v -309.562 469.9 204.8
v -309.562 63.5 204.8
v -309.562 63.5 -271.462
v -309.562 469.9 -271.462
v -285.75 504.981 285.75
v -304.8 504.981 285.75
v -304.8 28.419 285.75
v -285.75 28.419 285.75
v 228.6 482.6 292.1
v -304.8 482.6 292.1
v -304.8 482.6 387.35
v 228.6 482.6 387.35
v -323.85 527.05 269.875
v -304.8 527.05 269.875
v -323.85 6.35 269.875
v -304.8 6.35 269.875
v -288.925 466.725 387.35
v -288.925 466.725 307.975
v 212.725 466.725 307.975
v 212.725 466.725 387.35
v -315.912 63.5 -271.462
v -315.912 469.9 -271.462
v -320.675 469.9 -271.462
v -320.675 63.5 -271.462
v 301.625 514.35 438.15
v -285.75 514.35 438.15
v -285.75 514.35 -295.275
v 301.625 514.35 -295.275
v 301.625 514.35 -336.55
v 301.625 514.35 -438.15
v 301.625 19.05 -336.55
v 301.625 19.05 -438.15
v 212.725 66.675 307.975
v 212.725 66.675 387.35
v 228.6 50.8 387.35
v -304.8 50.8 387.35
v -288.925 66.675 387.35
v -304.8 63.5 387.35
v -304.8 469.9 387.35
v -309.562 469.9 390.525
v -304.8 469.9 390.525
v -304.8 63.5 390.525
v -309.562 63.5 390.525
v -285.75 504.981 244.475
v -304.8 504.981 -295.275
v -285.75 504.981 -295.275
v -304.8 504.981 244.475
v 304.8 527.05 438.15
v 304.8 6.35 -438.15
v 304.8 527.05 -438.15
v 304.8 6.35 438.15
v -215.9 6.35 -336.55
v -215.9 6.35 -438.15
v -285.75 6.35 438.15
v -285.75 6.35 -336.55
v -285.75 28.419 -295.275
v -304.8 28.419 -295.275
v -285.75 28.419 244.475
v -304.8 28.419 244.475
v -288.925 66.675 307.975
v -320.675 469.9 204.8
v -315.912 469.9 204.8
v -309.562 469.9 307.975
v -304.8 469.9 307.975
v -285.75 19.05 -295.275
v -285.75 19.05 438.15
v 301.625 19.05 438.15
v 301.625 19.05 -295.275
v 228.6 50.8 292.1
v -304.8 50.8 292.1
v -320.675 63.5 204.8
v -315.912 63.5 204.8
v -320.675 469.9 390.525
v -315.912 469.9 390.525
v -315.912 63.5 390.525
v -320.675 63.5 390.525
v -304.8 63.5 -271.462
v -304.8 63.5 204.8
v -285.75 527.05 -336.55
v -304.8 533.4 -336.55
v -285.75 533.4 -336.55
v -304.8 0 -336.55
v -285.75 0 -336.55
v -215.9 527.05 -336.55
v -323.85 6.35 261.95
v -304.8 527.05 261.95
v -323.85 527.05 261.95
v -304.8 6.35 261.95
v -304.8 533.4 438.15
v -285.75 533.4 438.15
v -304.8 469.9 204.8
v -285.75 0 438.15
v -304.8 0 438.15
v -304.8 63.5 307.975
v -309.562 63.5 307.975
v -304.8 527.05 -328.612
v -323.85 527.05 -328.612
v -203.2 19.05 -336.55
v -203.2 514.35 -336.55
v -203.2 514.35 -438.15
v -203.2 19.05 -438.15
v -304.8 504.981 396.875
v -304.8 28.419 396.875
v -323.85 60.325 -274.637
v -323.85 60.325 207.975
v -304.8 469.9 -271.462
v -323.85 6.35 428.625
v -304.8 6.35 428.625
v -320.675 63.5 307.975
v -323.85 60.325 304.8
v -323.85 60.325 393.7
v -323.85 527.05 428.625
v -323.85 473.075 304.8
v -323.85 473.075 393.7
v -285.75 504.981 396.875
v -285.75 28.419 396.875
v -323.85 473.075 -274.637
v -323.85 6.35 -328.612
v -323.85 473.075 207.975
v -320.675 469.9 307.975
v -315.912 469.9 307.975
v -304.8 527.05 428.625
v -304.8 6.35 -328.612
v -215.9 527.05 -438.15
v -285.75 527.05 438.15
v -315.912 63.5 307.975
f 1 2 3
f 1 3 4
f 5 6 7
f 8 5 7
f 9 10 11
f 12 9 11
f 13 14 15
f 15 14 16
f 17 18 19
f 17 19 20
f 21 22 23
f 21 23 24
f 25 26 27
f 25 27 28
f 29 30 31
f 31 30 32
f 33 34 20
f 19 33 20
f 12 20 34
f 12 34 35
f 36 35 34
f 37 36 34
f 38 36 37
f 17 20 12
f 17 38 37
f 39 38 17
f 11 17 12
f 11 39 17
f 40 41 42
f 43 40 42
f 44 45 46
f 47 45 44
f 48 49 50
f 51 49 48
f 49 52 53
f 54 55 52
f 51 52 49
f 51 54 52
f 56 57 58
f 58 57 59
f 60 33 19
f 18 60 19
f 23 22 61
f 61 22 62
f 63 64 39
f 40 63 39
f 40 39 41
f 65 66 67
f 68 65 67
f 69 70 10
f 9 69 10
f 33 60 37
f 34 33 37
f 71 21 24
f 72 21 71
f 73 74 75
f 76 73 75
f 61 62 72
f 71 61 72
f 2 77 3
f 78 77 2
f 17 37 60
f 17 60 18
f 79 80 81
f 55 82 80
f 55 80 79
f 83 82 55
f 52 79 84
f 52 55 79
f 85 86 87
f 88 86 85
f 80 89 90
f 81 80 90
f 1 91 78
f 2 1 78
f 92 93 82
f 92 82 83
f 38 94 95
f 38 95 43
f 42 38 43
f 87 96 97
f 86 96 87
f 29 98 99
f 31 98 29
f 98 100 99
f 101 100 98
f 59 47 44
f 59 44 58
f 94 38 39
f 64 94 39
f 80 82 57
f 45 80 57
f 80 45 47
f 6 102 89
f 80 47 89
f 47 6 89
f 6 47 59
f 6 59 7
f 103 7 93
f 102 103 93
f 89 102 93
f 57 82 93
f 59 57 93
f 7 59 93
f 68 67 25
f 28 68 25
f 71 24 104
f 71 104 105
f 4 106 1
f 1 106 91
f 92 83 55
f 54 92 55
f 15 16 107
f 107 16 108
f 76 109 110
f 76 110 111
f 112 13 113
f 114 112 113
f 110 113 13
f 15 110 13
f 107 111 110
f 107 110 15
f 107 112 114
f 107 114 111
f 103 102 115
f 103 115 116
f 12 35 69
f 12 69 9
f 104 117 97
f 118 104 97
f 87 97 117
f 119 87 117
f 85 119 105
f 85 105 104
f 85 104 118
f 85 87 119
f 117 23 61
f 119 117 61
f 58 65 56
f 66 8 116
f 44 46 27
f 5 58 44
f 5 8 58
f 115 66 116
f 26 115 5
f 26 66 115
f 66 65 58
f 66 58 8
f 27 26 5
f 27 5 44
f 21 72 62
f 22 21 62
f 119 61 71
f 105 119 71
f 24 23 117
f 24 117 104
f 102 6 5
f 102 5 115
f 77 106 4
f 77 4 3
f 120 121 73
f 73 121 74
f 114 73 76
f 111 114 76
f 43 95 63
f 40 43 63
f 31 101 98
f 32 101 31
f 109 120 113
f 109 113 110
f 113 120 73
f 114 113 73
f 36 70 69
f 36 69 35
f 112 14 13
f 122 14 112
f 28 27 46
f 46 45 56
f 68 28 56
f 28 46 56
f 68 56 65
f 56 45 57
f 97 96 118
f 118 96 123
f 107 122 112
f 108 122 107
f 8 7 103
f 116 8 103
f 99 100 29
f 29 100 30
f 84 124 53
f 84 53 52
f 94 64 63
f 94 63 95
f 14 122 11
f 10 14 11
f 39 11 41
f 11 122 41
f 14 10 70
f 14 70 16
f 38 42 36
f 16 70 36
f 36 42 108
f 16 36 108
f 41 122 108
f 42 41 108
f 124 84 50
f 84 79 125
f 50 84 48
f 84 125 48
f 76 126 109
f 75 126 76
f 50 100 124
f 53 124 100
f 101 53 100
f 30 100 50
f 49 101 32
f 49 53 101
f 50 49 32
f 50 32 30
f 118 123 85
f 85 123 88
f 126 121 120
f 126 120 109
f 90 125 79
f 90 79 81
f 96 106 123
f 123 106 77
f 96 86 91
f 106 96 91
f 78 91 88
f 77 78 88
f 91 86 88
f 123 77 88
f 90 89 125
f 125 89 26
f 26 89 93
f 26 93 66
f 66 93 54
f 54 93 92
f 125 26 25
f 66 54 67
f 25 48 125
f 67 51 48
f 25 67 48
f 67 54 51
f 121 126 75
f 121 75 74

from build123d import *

# Parameters (mm, degrees)
F0_W          = 609.6
F0_H          = 876.3
F1_DEPTH      = 533.4
F2_W          = 88.9
F2_H          = 101.6
F3_DEPTH      = 533.401
F4_W          = 476.562295082
F4_H          = 692.15
F5_DEPTH      = 19.05
F6_W          = 590.55
F6_H          = 6.35
F7_DEPTH      = 876.301
F8_W          = 587.375
F8_H          = 495.3
F9_DEPTH      = 733.425
F10_W         = 476.562295082
F10_H         = 41.275
F11_DEPTH     = 19.05
F12_W         = 520.7
F12_H         = 590.5627
F12_W_2       = 406.4
F12_H_2       = 476.2627
F13_DEPTH     = 19.05
F14_W         = 6.35
F14_H         = 406.4
F15_DEPTH     = 476.2627
F16_SIZE      = 3.175
F17_W         = 520.7
F17_H         = 158.75
F17_W_2       = 406.4
F17_H_2       = 82.55
F18_DEPTH     = 19.05
F19_W         = 6.35
F19_H         = 406.4
F20_DEPTH     = 82.55
F21_SIZE      = 3.175
F22_W         = 504.825
F22_H         = 495.3
F23_DEPTH     = 101.6
F24_W         = 431.8
F24_H         = 95.25
F25_DEPTH     = 533.4
F26_T         = 15.875
F26_T3_DEPTH  = 37.249261314
F26_T5_DEPTH  = 37.249261314
F26_T7_DEPTH  = 37.249261314
F26_T9_DEPTH  = 37.249261314
F26_T11_DEPTH = 36.5125
F26_T13_DEPTH = 438.15
F26_T15_DEPTH = 114.3
F26_T17_DEPTH = 127
F26_T19_DEPTH = 463.55
F26_T21_DEPTH = 111.125
F26_T23_DEPTH = 36.5125


# Not quite as in the source:
# - a shell that OpenCascade refuses in one call is made with other operations: the cavity is built on its own and cut out


with BuildPart() as f1:
    # F0 (on Front) → F1 (new body)
    with BuildSketch(Plane.XZ):
        Rectangle(F0_W, F0_H)
    extrude(amount=-F1_DEPTH)

    # F2 (on face) → F3 (cut, through all)
    with BuildSketch(Plane.XZ):
        with Locations((-260.35, -387.35)):
            Rectangle(F2_W, F2_H)
    extrude(amount=-F3_DEPTH, mode=Mode.SUBTRACT)

    # F4 (on face) → F5 (cut)
    with BuildSketch(Plane(origin=(-304.8, 0, 0), x_dir=(0, -1, 0), z_dir=(-1, 0, 0))):
        with Locations((-266.7, 50.8)):
            Rectangle(F4_W, F4_H)
    extrude(amount=-F5_DEPTH, mode=Mode.SUBTRACT)

    # F6 (on face) → F7 (cut, through all)
    with BuildSketch(Plane.XY.offset(438.15)):
        with Locations((9.525, 530.225)):
            Rectangle(F6_W, F6_H)
        with Locations((9.525, 3.175)):
            Rectangle(F6_W, F6_H)
    extrude(amount=-F7_DEPTH, mode=Mode.SUBTRACT)

    # F8 (on face) → F9 (cut, through all)
    with BuildSketch(Plane.XY.offset(438.15)):
        with Locations((7.9375, 266.7)):
            Rectangle(F8_W, F8_H)
    extrude(amount=-F9_DEPTH, mode=Mode.SUBTRACT)

    # F10 (on face) → F11 (join, through all)
    with BuildSketch(Plane(origin=(-304.8, 0, 0), x_dir=(0, -1, 0), z_dir=(-1, 0, 0))):
        with Locations((-266.7, 265.1125)):
            Rectangle(F10_W, F10_H)
    extrude(amount=-F11_DEPTH)

    # F22 (on face) → F23 (cut)
    with BuildSketch(Plane(origin=(0, 0, -438.15), x_dir=(1, 0, 0), z_dir=(0, 0, -1))):
        with Locations((49.2125, -266.7)):
            Rectangle(F22_W, F22_H)
    extrude(amount=-F23_DEPTH, mode=Mode.SUBTRACT)


with BuildPart() as f13:
    # F12 (on face) → F13 (new body)
    with BuildSketch(Plane(origin=(-304.8, 0, 0), x_dir=(0, -1, 0), z_dir=(-1, 0, 0))):
        with Locations((-266.7, -33.33115)):
            Rectangle(F12_W, F12_H)
        with Locations((-266.7, -33.33115)):
            Rectangle(F12_W_2, F12_H_2, mode=Mode.SUBTRACT)
    extrude(amount=F13_DEPTH)

    # F14 (on face) → F15 (join, through all)
    with BuildSketch(Plane.XY.offset(-271.4625)):
        with Locations((-312.7375, 266.7)):
            Rectangle(F14_W, F14_H)
    extrude(amount=F15_DEPTH)

    # F16
    f16_edges = [f13.edges().sort_by_distance(p)[0] for p in [
        (-323.85, 469.9, -33.33115),
        (-323.85, 266.7, -271.4625),
        (-323.85, 63.5, -33.33115),
        (-323.85, 266.7, 204.8002),
    ]]
    chamfer(f16_edges, length=F16_SIZE)


with BuildPart() as f18:
    # F17 (on face) → F18 (new body)
    with BuildSketch(Plane(origin=(-304.8, 0, 0), x_dir=(0, -1, 0), z_dir=(-1, 0, 0))):
        with Locations((-266.7, 349.25)):
            Rectangle(F17_W, F17_H)
        with Locations((-266.7, 349.25)):
            Rectangle(F17_W_2, F17_H_2, mode=Mode.SUBTRACT)
    extrude(amount=F18_DEPTH)

    # F19 (on face) → F20 (join, through all)
    with BuildSketch(Plane.XY.offset(307.975)):
        with Locations((-312.7375, 266.7)):
            Rectangle(F19_W, F19_H)
    extrude(amount=F20_DEPTH)

    # F21
    f21_edges = [f18.edges().sort_by_distance(p)[0] for p in [
        (-323.85, 266.7, 307.975),
        (-323.85, 469.9, 349.25),
        (-323.85, 266.7, 390.525),
        (-323.85, 63.5, 349.25),
    ]]
    chamfer(f21_edges, length=F21_SIZE)

    # F24 (on face) → F25 (join)
    with BuildSketch(Plane.YZ.offset(-304.8)):
        with Locations((266.7, 339.725)):
            Rectangle(F24_W, F24_H)
    extrude(amount=F25_DEPTH)

    # F26: shell of thickness 15.875, made by hand


with BuildPart() as f26_core1:
    # F26_t2: copy of F18
    add(f18.part)

    # the walls: a layer under each face that stays
    f26_faces = [f26_core1.faces().sort_by_distance(p)[0] for p in [
        (-323.85, 440.2666666667, 296.3333333333),
        (-322.2625, 266.7, 306.3875),
        (-322.2625, 61.9125, 349.25),
        (-322.2625, 471.4875, 349.25),
        (-322.2625, 266.7, 392.1125),
        (-314.325, 266.7, 428.625),
        (-314.325, 527.05, 349.25),
        (-314.325, 266.7, 269.875),
        (-314.325, 6.35, 349.25),
        (-318.29375, 266.7, 307.975),
        (-318.29375, 63.5, 349.25),
        (-318.29375, 469.9, 349.25),
        (-318.29375, 266.7, 390.525),
        (-304.8, 440.2666666667, 402.1666666667),
        (-315.9125, 266.7, 349.25),
        (-38.1, 482.6, 339.725),
        (-38.1, 266.7, 292.1),
        (-38.1, 50.8, 339.725),
        (-307.18125, 63.5, 349.25),
        (-307.18125, 266.7, 390.525),
        (-307.18125, 469.9, 349.25),
        (-304.8, 266.7, 347.6625),
        (228.6, 266.7, 339.725),
        (-307.18125, 266.7, 307.975),
        (-309.5625, 266.7, 349.25),
    ]]
    thicken(f26_faces, amount=-F26_T, mode=Mode.SUBTRACT)

    # F26_s4 → F26_t3 (cut)
    with BuildSketch(Plane(origin=(4.5928978099, 4.5928978099, 4.5928978099), x_dir=(-0.7071067812, 0.7071067812, 0), z_dir=(0.5773502692, 0.5773502692, 0.5773502692))):
        Polygon((271.8908726623, 356.5892701441), (263.7152476623, 342.7036353262), (255.7777476623, 347.2863530879), (255.7777476623, 356.4517886113), align=None)
    extrude(amount=F26_T3_DEPTH, mode=Mode.SUBTRACT)

    # F26_s6 → F26_t5 (cut)
    with BuildSketch(Plane(origin=(-173.2071021901, 173.2071021901, -173.2071021901), x_dir=(0.7071067812, 0.7071067812, 0), z_dir=(0.5773502692, -0.5773502692, 0.5773502692))):
        Polygon((105.2798844226, 574.3489082775), (113.4555094226, 560.4632734596), (121.3930094226, 565.0459912213), (121.3930094226, 574.2114267447), align=None)
    extrude(amount=F26_T5_DEPTH, mode=Mode.SUBTRACT)

    # F26_s8 → F26_t7 (cut)
    with BuildSketch(Plane(origin=(-228.2404355234, -228.2404355234, 228.2404355234), x_dir=(-0.7071067812, 0.7071067812, 0), z_dir=(0.5773502692, 0.5773502692, -0.5773502692))):
        Polygon((271.8908726623, 213.7335916339), (255.7777476623, 213.8710731668), (255.7777476623, 223.0365086901), (263.7152476623, 227.6192264518), align=None)
    extrude(amount=F26_T7_DEPTH, mode=Mode.SUBTRACT)

    # F26_s10 → F26_t9 (cut)
    with BuildSketch(Plane(origin=(-406.0404355234, 406.0404355234, 406.0404355234), x_dir=(0.7071067812, 0.7071067812, 0), z_dir=(0.5773502692, -0.5773502692, -0.5773502692))):
        Polygon((105.2798844226, -4.0260464995), (121.3930094226, -3.8885649667), (121.3930094226, 5.2768705567), (113.4555094226, 9.8595883184), align=None)
    extrude(amount=F26_T9_DEPTH, mode=Mode.SUBTRACT)

    # F26_s12 → F26_t11 (cut)
    with BuildSketch(Plane.YZ.offset(-336.55)):
        Polygon((469.74125, 308.13375), (469.9, 292.1), (485.775, 292.1), (485.775, 307.975), align=None)
        Polygon((63.65875, 308.13375), (63.5, 292.1), (47.625, 292.1), (47.625, 307.975), align=None)
        Polygon((63.65875, 390.36625), (47.625, 390.525), (47.625, 406.4), (63.5, 406.4), align=None)
        Polygon((469.74125, 390.36625), (485.775, 390.525), (485.775, 406.4), (469.9, 406.4), align=None)
    extrude(amount=F26_T11_DEPTH, mode=Mode.SUBTRACT)

    # F26_s14 → F26_t13 (cut)
    with BuildSketch(Plane.XZ.offset(-485.775)):
        Polygon((-316.07125, 308.13375), (-315.9125, 292.1), (-300.0375, 292.1), (-300.0375, 307.975), align=None)
        Polygon((-316.07125, 390.36625), (-315.9125, 406.4), (-300.0375, 406.4), (-300.0375, 390.525), align=None)
        Polygon((-309.40375, 390.36625), (-309.5625, 406.4), (-325.4375, 406.4), (-325.4375, 390.525), align=None)
        Polygon((-304.95875, 308.13375), (-288.925, 307.975), (-288.925, 292.1), (-304.8, 292.1), align=None)
        Polygon((-309.40375, 308.13375), (-309.5625, 292.1), (-325.4375, 292.1), (-325.4375, 307.975), align=None)
    extrude(amount=F26_T13_DEPTH, mode=Mode.SUBTRACT)

    # F26_s16 → F26_t15 (cut)
    with BuildSketch(Plane.XY.offset(292.1)):
        Polygon((-316.07125, 63.65875), (-315.9125, 47.625), (-300.0375, 47.625), (-300.0375, 63.5), align=None)
        Polygon((-316.07125, 469.74125), (-315.9125, 485.775), (-300.0375, 485.775), (-300.0375, 469.9), align=None)
        Polygon((-309.40375, 63.65875), (-309.5625, 47.625), (-325.4375, 47.625), (-325.4375, 63.5), align=None)
        Polygon((-309.40375, 469.74125), (-309.5625, 485.775), (-325.4375, 485.775), (-325.4375, 469.9), align=None)
    extrude(amount=F26_T15_DEPTH, mode=Mode.SUBTRACT)

    # F26_s18 → F26_t17 (cut)
    with BuildSketch(Plane.XY.offset(276.225)):
        Polygon((-304.64125, 482.75875), (-320.675, 482.6), (-320.675, 466.725), (-304.8, 466.725), align=None)
        Polygon((-304.64125, 50.64125), (-320.675, 50.8), (-320.675, 66.675), (-304.8, 66.675), align=None)
    extrude(amount=F26_T17_DEPTH, mode=Mode.SUBTRACT)

    # F26_s20 → F26_t19 (cut)
    with BuildSketch(Plane.XZ.offset(-498.475)):
        Polygon((-304.64125, 291.94125), (-320.675, 292.1), (-320.675, 307.975), (-304.8, 307.975), align=None)
    extrude(amount=F26_T19_DEPTH, mode=Mode.SUBTRACT)

    # F26_s22 → F26_t21 (cut)
    with BuildSketch(Plane.XY.offset(292.1)):
        Polygon((-304.95875, 63.65875), (-304.8, 47.625), (-288.925, 47.625), (-288.925, 63.5), align=None)
        Polygon((-304.95875, 469.74125), (-304.8, 485.775), (-288.925, 485.775), (-288.925, 469.9), align=None)
    extrude(amount=F26_T21_DEPTH, mode=Mode.SUBTRACT)

    # F26_s24 → F26_t23 (cut)
    with BuildSketch(Plane.YZ.offset(-325.4375)):
        Polygon((63.65875, 308.13375), (47.625, 307.975), (47.625, 292.1), (63.5, 292.1), align=None)
        Polygon((63.65875, 390.36625), (47.625, 390.525), (47.625, 406.4), (63.5, 406.4), align=None)
        Polygon((469.74125, 390.36625), (469.9, 406.4), (485.775, 406.4), (485.775, 390.525), align=None)
        Polygon((469.74125, 308.13375), (485.775, 307.975), (485.775, 292.1), (469.9, 292.1), align=None)
    extrude(amount=F26_T23_DEPTH, mode=Mode.SUBTRACT)


with BuildPart() as f18_1:
    add(f18.part)

    # what is left inside the walls is the cavity
    f26_cavity = [f26_core1.part.solids().sort_by_distance(p)[0] for p in [
        (45.508333, 266.7, 308.13375),
    ]]
    add(f26_cavity, mode=Mode.SUBTRACT)


solid = Compound([f1.part, f13.part, f18_1.part])
